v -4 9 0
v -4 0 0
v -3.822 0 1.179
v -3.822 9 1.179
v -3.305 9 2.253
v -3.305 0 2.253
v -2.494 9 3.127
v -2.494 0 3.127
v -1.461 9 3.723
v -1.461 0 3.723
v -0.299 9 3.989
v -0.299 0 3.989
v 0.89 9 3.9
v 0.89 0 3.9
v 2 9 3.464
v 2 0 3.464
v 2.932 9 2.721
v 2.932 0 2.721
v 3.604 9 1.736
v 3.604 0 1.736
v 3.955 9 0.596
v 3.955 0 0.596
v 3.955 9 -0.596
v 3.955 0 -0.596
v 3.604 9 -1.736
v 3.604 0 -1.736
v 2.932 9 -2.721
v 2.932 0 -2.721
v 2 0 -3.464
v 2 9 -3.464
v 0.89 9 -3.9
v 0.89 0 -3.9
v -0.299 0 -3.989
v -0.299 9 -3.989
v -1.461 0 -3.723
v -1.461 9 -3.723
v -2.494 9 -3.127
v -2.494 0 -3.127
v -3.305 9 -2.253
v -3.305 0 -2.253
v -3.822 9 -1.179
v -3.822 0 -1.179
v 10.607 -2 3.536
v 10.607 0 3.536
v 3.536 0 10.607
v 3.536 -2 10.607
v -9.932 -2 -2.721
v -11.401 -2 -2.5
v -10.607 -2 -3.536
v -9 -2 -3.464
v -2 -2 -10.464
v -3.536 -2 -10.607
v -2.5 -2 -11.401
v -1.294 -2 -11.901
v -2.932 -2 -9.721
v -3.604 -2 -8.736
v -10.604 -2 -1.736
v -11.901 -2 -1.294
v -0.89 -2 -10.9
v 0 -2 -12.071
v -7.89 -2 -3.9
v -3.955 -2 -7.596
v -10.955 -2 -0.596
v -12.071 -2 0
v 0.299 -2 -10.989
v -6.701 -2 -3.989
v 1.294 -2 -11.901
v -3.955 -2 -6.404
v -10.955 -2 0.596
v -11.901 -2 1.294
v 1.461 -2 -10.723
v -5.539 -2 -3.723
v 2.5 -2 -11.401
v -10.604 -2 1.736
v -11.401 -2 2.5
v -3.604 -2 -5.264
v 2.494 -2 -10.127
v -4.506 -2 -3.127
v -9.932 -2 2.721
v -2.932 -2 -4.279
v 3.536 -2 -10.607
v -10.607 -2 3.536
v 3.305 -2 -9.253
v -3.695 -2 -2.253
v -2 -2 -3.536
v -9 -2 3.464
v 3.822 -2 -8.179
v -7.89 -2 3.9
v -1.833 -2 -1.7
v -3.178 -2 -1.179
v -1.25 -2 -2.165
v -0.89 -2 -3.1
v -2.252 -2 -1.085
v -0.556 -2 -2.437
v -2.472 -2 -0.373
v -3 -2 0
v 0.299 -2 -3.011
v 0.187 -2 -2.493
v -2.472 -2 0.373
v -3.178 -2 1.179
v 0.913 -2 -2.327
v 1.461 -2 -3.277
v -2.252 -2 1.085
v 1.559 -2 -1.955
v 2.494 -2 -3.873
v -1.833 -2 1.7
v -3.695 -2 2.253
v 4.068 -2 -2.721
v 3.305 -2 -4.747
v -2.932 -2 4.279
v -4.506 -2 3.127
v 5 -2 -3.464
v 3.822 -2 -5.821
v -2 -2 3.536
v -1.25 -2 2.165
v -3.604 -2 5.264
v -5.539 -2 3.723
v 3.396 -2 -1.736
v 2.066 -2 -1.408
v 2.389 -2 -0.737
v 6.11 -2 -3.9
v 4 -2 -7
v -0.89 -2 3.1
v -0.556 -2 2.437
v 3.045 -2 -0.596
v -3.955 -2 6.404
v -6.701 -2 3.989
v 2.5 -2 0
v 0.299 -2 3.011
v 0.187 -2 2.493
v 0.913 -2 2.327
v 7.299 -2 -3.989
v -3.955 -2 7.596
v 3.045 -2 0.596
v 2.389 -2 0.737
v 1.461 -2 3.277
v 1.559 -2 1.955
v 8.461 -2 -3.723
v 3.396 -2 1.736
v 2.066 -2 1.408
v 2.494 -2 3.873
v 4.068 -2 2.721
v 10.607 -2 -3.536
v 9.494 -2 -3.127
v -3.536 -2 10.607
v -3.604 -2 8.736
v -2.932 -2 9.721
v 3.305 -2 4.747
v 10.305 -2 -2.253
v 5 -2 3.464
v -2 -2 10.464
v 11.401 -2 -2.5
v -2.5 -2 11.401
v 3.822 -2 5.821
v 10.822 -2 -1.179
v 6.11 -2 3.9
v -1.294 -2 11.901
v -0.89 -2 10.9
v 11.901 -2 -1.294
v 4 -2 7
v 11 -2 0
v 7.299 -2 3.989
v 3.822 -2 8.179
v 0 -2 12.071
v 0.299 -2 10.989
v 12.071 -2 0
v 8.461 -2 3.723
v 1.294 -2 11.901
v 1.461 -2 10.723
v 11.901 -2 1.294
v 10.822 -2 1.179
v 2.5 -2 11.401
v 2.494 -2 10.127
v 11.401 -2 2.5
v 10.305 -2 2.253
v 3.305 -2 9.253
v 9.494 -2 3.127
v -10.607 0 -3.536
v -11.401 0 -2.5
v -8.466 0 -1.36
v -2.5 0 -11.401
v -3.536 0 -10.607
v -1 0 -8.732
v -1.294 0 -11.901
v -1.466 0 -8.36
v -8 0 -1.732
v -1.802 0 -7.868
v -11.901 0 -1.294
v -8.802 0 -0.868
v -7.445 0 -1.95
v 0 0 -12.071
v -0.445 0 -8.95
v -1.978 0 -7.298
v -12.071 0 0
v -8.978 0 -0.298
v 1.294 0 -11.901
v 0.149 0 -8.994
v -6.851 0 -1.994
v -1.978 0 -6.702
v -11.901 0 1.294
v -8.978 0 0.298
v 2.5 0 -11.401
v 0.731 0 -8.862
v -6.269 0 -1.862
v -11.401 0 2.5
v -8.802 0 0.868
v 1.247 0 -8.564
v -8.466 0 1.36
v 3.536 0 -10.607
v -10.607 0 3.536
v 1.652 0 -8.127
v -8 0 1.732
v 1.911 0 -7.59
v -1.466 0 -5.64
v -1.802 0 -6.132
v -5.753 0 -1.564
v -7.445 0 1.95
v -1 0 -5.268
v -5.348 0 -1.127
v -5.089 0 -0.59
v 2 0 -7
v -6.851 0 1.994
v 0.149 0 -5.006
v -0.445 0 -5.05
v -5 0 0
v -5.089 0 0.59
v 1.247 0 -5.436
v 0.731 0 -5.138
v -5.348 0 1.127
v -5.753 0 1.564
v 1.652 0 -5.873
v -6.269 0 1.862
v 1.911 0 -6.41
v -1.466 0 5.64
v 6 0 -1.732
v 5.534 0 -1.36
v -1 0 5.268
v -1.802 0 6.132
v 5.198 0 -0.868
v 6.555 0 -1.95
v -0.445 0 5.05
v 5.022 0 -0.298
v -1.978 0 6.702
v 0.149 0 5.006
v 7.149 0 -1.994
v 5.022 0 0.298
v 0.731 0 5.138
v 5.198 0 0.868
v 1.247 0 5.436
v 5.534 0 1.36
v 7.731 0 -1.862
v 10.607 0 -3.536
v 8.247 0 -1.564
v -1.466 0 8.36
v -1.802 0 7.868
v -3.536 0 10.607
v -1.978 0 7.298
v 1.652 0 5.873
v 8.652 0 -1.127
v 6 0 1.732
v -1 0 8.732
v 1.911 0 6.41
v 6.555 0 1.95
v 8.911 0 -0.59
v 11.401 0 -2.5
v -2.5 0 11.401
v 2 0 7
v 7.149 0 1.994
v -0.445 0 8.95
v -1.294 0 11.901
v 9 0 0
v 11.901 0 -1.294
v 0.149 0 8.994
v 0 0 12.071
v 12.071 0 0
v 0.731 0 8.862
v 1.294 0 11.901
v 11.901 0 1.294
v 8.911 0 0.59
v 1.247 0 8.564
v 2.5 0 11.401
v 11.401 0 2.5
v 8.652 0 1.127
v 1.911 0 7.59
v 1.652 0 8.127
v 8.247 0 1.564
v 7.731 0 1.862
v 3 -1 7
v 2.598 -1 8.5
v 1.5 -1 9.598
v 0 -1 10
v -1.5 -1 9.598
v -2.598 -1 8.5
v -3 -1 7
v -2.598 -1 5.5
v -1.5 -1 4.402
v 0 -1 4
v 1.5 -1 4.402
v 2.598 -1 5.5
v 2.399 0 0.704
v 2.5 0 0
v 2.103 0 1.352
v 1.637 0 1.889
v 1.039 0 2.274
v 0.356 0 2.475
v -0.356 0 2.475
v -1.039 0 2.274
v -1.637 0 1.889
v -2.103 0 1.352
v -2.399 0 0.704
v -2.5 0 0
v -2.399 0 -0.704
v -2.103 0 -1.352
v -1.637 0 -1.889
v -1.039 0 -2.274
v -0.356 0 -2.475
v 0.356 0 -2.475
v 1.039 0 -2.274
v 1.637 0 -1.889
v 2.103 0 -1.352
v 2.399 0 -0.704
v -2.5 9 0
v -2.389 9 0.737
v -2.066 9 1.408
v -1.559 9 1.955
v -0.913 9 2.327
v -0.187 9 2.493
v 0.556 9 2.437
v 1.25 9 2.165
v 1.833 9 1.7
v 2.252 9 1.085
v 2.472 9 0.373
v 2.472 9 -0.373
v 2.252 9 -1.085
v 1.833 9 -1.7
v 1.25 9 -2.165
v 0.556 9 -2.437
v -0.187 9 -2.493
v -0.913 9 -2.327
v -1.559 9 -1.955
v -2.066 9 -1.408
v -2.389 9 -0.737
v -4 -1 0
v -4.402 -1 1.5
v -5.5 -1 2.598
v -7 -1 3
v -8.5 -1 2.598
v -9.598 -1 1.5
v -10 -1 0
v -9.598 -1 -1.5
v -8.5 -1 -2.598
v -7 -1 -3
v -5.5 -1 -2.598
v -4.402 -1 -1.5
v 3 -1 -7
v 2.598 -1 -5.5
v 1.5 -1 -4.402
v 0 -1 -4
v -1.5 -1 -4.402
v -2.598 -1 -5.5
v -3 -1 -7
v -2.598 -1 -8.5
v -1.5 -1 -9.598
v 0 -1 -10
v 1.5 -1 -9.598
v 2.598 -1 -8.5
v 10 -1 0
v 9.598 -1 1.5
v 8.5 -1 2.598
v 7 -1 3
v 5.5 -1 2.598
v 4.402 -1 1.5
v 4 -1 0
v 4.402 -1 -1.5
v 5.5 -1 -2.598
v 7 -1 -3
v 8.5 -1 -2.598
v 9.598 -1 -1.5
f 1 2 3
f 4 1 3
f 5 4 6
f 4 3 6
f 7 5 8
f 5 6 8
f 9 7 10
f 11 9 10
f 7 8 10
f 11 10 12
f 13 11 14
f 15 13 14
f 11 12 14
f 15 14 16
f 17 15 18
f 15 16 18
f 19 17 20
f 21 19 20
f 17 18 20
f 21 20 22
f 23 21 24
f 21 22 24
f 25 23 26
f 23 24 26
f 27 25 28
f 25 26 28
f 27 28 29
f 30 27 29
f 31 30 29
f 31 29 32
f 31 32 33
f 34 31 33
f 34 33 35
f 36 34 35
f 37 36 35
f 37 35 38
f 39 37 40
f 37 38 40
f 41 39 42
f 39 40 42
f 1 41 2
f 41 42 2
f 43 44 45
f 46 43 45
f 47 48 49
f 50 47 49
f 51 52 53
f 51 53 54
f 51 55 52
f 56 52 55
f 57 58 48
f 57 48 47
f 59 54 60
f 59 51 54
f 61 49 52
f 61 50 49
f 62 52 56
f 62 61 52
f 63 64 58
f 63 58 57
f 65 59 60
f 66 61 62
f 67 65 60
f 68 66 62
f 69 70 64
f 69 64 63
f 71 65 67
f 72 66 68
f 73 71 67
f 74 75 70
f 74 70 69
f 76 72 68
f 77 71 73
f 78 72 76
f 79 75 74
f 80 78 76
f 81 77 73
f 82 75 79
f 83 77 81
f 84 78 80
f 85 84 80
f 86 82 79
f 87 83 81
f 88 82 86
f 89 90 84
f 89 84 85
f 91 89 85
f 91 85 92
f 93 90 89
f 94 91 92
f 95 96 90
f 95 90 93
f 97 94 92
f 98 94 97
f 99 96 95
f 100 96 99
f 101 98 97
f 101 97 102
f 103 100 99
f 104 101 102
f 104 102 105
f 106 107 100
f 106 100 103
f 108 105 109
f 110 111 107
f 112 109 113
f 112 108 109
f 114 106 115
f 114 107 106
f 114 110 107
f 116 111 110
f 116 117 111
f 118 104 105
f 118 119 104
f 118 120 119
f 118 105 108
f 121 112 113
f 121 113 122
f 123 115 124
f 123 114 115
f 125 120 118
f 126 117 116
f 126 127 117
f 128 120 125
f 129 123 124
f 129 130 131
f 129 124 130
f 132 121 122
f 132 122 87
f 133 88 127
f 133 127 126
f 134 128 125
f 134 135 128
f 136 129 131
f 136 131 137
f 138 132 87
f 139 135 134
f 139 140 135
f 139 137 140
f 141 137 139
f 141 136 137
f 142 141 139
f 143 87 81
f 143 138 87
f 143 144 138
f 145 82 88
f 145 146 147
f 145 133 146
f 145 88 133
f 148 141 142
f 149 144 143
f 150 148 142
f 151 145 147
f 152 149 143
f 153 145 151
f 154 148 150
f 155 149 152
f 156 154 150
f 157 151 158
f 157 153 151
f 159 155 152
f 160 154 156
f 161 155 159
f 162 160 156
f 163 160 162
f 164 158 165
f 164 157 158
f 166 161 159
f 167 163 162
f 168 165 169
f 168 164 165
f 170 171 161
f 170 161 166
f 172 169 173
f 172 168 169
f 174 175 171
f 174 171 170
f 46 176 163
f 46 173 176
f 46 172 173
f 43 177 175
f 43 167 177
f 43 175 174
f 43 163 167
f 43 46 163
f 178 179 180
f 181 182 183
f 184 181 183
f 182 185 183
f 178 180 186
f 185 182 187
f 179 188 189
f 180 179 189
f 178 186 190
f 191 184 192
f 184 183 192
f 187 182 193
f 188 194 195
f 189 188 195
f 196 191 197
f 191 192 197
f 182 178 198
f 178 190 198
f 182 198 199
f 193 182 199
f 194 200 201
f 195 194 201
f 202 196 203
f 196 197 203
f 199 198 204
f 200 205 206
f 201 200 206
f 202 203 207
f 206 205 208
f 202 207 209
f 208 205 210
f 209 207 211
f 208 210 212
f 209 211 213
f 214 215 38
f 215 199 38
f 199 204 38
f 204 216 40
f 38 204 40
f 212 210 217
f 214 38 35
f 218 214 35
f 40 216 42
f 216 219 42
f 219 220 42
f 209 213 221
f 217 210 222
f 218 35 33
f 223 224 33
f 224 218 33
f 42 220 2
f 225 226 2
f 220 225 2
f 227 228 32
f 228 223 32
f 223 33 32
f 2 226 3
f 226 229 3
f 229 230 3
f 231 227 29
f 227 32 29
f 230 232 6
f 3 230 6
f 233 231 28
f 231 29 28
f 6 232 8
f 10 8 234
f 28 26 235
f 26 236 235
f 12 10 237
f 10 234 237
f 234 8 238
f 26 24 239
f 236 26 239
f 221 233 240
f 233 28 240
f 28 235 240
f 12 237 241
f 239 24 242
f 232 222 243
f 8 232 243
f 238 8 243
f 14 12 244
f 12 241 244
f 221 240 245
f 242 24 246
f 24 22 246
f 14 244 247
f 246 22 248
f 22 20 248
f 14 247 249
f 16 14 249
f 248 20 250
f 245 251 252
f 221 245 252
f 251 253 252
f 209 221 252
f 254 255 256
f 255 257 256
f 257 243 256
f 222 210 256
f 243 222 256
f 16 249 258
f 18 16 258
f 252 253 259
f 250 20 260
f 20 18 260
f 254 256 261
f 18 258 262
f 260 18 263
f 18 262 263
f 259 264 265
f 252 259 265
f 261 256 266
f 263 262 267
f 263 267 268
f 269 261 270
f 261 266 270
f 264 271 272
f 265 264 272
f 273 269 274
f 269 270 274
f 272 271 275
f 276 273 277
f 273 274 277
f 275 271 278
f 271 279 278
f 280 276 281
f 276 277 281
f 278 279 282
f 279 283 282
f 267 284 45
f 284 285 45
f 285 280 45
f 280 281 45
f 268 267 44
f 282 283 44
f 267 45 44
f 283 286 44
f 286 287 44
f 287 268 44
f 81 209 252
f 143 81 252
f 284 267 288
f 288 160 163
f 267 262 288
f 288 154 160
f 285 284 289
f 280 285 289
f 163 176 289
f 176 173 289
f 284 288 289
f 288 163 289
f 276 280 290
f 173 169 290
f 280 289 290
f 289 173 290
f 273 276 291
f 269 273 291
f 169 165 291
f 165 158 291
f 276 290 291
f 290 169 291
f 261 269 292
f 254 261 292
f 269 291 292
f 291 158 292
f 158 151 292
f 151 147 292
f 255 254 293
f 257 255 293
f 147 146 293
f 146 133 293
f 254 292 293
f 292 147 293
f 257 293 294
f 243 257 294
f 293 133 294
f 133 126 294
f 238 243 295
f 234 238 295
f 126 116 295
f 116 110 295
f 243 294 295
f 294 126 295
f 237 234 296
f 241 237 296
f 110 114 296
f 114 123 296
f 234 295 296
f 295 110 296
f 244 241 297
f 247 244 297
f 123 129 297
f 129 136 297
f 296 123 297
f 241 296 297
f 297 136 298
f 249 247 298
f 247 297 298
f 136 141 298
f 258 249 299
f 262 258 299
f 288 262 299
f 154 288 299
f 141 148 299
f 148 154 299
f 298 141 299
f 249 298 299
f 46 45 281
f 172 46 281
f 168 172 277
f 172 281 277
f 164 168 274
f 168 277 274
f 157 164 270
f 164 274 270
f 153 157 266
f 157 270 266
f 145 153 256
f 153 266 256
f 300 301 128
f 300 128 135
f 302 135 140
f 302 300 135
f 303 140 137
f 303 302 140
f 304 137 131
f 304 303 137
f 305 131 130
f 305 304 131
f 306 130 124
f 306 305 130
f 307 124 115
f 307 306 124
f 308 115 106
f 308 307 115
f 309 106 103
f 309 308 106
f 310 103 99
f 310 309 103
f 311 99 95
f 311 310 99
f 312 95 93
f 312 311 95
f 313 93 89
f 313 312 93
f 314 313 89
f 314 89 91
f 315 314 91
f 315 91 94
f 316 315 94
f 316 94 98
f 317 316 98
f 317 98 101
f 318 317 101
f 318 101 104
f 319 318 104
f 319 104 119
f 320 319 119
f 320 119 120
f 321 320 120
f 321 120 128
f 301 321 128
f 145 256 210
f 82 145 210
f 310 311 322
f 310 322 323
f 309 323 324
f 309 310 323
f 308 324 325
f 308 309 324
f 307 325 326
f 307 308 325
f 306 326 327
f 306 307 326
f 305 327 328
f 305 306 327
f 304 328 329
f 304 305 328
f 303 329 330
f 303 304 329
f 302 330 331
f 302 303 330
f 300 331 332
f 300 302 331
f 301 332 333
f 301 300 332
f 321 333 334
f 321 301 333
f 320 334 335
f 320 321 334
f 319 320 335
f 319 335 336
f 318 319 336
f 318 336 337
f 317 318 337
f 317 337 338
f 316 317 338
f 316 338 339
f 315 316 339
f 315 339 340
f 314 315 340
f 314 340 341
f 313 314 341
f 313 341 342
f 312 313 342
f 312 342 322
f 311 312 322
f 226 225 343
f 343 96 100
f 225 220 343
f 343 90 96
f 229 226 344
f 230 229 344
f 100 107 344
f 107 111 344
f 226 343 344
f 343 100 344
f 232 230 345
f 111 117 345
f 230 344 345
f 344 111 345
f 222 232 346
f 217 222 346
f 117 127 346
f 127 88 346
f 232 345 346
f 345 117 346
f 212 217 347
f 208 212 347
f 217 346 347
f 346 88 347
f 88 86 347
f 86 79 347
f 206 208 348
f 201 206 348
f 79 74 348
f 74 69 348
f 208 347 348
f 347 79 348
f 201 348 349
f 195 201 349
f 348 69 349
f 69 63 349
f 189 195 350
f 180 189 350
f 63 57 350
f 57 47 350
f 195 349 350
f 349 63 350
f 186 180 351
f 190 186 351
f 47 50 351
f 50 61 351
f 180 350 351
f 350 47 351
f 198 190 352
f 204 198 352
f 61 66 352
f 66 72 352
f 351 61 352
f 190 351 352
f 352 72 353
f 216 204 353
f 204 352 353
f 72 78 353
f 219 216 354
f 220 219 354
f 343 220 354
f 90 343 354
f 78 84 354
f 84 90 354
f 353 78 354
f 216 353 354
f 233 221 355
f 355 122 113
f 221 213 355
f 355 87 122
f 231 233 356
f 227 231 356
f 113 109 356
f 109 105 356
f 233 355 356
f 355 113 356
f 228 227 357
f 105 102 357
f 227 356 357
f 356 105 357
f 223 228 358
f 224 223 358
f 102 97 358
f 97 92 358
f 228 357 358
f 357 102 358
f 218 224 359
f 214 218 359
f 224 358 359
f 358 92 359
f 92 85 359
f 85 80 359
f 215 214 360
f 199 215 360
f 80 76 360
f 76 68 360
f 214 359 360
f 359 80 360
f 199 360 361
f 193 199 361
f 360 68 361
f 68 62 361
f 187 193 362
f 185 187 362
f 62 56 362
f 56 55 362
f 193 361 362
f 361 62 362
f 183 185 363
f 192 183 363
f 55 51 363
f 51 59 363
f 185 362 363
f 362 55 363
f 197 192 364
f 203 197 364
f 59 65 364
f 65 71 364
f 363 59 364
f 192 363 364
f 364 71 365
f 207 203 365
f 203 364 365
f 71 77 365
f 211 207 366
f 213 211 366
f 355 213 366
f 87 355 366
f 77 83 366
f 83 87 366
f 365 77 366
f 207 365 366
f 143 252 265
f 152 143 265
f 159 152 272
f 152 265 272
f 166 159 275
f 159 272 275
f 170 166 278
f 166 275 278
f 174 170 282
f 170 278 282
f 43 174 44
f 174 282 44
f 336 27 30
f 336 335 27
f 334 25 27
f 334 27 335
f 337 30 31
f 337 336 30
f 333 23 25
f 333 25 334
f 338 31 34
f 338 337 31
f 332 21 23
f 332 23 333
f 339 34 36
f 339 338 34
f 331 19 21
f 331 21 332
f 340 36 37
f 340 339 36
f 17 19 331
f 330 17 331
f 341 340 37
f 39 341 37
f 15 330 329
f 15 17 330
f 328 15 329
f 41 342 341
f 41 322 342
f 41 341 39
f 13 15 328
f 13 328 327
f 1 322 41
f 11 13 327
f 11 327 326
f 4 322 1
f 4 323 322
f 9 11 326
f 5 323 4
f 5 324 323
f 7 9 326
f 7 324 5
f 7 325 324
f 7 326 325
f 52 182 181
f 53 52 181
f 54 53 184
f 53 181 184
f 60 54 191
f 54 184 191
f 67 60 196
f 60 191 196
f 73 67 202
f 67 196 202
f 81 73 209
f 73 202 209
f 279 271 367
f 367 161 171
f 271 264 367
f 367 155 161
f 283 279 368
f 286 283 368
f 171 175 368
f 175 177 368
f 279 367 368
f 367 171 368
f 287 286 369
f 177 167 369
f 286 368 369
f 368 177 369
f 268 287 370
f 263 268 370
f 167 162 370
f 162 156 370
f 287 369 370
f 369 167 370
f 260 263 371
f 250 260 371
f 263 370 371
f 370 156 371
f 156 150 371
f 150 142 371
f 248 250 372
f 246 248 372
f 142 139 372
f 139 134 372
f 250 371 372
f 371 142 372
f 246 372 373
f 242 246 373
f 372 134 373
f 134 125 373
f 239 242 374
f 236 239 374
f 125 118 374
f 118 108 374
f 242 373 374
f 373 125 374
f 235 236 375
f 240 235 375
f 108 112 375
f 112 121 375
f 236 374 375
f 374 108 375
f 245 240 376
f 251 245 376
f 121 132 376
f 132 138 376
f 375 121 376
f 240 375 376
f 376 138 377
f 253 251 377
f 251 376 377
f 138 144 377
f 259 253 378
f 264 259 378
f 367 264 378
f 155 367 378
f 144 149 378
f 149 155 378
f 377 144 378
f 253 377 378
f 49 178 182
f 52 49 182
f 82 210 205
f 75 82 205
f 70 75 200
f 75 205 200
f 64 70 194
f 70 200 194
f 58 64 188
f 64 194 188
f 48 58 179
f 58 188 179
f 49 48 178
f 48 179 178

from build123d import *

# Parameters (mm, degrees)
F0_R     = 2
F0_R_2   = 2.5
F1_DEPTH = 2
F2_SIZE  = 1.99999
F3_R     = 4
F3_R_2   = 2.5
F4_DEPTH = 9


# Not quite as in the source:
# - a fillet or chamfer is up to 0.001 mm smaller than in the source, because OpenCascade refuses the exact size


with BuildPart() as f1:
    # F0 (on Front) → F1 (new body)
    with BuildSketch(Plane.XZ):
        with BuildLine():
            Line((-10.6066017178, -3.5355339059), (-3.5355339059, -10.6066017178))
            ThreePointArc((-3.5355339059, -10.6066017178), (0, -12.0710678119), (3.5355339059, -10.6066017178))
            Line((3.5355339059, -10.6066017178), (10.6066017178, -3.5355339059))
            ThreePointArc((10.6066017178, -3.5355339059), (12.0710678119, 0), (10.6066017178, 3.5355339059))
            Line((10.6066017178, 3.5355339059), (3.5355339059, 10.6066017178))
            ThreePointArc((3.5355339059, 10.6066017178), (0, 12.0710678119), (-3.5355339059, 10.6066017178))
            Line((-3.5355339059, 10.6066017178), (-10.6066017178, 3.5355339059))
            ThreePointArc((-10.6066017178, 3.5355339059), (-12.0710678119, 0), (-10.6066017178, -3.5355339059))
        make_face()
        with Locations((-7, 0)):
            Circle(F0_R, mode=Mode.SUBTRACT)
        with Locations((0, -7)):
            Circle(F0_R, mode=Mode.SUBTRACT)
        Circle(F0_R_2, mode=Mode.SUBTRACT)
        with Locations((7, 0)):
            Circle(F0_R, mode=Mode.SUBTRACT)
        with Locations((0, 7)):
            Circle(F0_R, mode=Mode.SUBTRACT)
    extrude(amount=F1_DEPTH)

    # F2 (size 2 in the source; OpenCascade refuses exactly that, so slightly less here)
    f2_edges = [f1.edges().sort_by_distance(p)[0] for p in [
        (5, -2, 0),
        (-2, -2, -7),
        (-9, -2, 0),
        (-2, -2, 7),
    ]]
    chamfer(f2_edges, length=F2_SIZE)

    # F3 (on face) → F4 (join)
    with BuildSketch(Plane(origin=(0, 0, 0), x_dir=(-1, 0, 0), z_dir=(0, 1, 0))):
        Circle(F3_R)
        Circle(F3_R_2, mode=Mode.SUBTRACT)
    extrude(amount=F4_DEPTH)


solid = f1.part
